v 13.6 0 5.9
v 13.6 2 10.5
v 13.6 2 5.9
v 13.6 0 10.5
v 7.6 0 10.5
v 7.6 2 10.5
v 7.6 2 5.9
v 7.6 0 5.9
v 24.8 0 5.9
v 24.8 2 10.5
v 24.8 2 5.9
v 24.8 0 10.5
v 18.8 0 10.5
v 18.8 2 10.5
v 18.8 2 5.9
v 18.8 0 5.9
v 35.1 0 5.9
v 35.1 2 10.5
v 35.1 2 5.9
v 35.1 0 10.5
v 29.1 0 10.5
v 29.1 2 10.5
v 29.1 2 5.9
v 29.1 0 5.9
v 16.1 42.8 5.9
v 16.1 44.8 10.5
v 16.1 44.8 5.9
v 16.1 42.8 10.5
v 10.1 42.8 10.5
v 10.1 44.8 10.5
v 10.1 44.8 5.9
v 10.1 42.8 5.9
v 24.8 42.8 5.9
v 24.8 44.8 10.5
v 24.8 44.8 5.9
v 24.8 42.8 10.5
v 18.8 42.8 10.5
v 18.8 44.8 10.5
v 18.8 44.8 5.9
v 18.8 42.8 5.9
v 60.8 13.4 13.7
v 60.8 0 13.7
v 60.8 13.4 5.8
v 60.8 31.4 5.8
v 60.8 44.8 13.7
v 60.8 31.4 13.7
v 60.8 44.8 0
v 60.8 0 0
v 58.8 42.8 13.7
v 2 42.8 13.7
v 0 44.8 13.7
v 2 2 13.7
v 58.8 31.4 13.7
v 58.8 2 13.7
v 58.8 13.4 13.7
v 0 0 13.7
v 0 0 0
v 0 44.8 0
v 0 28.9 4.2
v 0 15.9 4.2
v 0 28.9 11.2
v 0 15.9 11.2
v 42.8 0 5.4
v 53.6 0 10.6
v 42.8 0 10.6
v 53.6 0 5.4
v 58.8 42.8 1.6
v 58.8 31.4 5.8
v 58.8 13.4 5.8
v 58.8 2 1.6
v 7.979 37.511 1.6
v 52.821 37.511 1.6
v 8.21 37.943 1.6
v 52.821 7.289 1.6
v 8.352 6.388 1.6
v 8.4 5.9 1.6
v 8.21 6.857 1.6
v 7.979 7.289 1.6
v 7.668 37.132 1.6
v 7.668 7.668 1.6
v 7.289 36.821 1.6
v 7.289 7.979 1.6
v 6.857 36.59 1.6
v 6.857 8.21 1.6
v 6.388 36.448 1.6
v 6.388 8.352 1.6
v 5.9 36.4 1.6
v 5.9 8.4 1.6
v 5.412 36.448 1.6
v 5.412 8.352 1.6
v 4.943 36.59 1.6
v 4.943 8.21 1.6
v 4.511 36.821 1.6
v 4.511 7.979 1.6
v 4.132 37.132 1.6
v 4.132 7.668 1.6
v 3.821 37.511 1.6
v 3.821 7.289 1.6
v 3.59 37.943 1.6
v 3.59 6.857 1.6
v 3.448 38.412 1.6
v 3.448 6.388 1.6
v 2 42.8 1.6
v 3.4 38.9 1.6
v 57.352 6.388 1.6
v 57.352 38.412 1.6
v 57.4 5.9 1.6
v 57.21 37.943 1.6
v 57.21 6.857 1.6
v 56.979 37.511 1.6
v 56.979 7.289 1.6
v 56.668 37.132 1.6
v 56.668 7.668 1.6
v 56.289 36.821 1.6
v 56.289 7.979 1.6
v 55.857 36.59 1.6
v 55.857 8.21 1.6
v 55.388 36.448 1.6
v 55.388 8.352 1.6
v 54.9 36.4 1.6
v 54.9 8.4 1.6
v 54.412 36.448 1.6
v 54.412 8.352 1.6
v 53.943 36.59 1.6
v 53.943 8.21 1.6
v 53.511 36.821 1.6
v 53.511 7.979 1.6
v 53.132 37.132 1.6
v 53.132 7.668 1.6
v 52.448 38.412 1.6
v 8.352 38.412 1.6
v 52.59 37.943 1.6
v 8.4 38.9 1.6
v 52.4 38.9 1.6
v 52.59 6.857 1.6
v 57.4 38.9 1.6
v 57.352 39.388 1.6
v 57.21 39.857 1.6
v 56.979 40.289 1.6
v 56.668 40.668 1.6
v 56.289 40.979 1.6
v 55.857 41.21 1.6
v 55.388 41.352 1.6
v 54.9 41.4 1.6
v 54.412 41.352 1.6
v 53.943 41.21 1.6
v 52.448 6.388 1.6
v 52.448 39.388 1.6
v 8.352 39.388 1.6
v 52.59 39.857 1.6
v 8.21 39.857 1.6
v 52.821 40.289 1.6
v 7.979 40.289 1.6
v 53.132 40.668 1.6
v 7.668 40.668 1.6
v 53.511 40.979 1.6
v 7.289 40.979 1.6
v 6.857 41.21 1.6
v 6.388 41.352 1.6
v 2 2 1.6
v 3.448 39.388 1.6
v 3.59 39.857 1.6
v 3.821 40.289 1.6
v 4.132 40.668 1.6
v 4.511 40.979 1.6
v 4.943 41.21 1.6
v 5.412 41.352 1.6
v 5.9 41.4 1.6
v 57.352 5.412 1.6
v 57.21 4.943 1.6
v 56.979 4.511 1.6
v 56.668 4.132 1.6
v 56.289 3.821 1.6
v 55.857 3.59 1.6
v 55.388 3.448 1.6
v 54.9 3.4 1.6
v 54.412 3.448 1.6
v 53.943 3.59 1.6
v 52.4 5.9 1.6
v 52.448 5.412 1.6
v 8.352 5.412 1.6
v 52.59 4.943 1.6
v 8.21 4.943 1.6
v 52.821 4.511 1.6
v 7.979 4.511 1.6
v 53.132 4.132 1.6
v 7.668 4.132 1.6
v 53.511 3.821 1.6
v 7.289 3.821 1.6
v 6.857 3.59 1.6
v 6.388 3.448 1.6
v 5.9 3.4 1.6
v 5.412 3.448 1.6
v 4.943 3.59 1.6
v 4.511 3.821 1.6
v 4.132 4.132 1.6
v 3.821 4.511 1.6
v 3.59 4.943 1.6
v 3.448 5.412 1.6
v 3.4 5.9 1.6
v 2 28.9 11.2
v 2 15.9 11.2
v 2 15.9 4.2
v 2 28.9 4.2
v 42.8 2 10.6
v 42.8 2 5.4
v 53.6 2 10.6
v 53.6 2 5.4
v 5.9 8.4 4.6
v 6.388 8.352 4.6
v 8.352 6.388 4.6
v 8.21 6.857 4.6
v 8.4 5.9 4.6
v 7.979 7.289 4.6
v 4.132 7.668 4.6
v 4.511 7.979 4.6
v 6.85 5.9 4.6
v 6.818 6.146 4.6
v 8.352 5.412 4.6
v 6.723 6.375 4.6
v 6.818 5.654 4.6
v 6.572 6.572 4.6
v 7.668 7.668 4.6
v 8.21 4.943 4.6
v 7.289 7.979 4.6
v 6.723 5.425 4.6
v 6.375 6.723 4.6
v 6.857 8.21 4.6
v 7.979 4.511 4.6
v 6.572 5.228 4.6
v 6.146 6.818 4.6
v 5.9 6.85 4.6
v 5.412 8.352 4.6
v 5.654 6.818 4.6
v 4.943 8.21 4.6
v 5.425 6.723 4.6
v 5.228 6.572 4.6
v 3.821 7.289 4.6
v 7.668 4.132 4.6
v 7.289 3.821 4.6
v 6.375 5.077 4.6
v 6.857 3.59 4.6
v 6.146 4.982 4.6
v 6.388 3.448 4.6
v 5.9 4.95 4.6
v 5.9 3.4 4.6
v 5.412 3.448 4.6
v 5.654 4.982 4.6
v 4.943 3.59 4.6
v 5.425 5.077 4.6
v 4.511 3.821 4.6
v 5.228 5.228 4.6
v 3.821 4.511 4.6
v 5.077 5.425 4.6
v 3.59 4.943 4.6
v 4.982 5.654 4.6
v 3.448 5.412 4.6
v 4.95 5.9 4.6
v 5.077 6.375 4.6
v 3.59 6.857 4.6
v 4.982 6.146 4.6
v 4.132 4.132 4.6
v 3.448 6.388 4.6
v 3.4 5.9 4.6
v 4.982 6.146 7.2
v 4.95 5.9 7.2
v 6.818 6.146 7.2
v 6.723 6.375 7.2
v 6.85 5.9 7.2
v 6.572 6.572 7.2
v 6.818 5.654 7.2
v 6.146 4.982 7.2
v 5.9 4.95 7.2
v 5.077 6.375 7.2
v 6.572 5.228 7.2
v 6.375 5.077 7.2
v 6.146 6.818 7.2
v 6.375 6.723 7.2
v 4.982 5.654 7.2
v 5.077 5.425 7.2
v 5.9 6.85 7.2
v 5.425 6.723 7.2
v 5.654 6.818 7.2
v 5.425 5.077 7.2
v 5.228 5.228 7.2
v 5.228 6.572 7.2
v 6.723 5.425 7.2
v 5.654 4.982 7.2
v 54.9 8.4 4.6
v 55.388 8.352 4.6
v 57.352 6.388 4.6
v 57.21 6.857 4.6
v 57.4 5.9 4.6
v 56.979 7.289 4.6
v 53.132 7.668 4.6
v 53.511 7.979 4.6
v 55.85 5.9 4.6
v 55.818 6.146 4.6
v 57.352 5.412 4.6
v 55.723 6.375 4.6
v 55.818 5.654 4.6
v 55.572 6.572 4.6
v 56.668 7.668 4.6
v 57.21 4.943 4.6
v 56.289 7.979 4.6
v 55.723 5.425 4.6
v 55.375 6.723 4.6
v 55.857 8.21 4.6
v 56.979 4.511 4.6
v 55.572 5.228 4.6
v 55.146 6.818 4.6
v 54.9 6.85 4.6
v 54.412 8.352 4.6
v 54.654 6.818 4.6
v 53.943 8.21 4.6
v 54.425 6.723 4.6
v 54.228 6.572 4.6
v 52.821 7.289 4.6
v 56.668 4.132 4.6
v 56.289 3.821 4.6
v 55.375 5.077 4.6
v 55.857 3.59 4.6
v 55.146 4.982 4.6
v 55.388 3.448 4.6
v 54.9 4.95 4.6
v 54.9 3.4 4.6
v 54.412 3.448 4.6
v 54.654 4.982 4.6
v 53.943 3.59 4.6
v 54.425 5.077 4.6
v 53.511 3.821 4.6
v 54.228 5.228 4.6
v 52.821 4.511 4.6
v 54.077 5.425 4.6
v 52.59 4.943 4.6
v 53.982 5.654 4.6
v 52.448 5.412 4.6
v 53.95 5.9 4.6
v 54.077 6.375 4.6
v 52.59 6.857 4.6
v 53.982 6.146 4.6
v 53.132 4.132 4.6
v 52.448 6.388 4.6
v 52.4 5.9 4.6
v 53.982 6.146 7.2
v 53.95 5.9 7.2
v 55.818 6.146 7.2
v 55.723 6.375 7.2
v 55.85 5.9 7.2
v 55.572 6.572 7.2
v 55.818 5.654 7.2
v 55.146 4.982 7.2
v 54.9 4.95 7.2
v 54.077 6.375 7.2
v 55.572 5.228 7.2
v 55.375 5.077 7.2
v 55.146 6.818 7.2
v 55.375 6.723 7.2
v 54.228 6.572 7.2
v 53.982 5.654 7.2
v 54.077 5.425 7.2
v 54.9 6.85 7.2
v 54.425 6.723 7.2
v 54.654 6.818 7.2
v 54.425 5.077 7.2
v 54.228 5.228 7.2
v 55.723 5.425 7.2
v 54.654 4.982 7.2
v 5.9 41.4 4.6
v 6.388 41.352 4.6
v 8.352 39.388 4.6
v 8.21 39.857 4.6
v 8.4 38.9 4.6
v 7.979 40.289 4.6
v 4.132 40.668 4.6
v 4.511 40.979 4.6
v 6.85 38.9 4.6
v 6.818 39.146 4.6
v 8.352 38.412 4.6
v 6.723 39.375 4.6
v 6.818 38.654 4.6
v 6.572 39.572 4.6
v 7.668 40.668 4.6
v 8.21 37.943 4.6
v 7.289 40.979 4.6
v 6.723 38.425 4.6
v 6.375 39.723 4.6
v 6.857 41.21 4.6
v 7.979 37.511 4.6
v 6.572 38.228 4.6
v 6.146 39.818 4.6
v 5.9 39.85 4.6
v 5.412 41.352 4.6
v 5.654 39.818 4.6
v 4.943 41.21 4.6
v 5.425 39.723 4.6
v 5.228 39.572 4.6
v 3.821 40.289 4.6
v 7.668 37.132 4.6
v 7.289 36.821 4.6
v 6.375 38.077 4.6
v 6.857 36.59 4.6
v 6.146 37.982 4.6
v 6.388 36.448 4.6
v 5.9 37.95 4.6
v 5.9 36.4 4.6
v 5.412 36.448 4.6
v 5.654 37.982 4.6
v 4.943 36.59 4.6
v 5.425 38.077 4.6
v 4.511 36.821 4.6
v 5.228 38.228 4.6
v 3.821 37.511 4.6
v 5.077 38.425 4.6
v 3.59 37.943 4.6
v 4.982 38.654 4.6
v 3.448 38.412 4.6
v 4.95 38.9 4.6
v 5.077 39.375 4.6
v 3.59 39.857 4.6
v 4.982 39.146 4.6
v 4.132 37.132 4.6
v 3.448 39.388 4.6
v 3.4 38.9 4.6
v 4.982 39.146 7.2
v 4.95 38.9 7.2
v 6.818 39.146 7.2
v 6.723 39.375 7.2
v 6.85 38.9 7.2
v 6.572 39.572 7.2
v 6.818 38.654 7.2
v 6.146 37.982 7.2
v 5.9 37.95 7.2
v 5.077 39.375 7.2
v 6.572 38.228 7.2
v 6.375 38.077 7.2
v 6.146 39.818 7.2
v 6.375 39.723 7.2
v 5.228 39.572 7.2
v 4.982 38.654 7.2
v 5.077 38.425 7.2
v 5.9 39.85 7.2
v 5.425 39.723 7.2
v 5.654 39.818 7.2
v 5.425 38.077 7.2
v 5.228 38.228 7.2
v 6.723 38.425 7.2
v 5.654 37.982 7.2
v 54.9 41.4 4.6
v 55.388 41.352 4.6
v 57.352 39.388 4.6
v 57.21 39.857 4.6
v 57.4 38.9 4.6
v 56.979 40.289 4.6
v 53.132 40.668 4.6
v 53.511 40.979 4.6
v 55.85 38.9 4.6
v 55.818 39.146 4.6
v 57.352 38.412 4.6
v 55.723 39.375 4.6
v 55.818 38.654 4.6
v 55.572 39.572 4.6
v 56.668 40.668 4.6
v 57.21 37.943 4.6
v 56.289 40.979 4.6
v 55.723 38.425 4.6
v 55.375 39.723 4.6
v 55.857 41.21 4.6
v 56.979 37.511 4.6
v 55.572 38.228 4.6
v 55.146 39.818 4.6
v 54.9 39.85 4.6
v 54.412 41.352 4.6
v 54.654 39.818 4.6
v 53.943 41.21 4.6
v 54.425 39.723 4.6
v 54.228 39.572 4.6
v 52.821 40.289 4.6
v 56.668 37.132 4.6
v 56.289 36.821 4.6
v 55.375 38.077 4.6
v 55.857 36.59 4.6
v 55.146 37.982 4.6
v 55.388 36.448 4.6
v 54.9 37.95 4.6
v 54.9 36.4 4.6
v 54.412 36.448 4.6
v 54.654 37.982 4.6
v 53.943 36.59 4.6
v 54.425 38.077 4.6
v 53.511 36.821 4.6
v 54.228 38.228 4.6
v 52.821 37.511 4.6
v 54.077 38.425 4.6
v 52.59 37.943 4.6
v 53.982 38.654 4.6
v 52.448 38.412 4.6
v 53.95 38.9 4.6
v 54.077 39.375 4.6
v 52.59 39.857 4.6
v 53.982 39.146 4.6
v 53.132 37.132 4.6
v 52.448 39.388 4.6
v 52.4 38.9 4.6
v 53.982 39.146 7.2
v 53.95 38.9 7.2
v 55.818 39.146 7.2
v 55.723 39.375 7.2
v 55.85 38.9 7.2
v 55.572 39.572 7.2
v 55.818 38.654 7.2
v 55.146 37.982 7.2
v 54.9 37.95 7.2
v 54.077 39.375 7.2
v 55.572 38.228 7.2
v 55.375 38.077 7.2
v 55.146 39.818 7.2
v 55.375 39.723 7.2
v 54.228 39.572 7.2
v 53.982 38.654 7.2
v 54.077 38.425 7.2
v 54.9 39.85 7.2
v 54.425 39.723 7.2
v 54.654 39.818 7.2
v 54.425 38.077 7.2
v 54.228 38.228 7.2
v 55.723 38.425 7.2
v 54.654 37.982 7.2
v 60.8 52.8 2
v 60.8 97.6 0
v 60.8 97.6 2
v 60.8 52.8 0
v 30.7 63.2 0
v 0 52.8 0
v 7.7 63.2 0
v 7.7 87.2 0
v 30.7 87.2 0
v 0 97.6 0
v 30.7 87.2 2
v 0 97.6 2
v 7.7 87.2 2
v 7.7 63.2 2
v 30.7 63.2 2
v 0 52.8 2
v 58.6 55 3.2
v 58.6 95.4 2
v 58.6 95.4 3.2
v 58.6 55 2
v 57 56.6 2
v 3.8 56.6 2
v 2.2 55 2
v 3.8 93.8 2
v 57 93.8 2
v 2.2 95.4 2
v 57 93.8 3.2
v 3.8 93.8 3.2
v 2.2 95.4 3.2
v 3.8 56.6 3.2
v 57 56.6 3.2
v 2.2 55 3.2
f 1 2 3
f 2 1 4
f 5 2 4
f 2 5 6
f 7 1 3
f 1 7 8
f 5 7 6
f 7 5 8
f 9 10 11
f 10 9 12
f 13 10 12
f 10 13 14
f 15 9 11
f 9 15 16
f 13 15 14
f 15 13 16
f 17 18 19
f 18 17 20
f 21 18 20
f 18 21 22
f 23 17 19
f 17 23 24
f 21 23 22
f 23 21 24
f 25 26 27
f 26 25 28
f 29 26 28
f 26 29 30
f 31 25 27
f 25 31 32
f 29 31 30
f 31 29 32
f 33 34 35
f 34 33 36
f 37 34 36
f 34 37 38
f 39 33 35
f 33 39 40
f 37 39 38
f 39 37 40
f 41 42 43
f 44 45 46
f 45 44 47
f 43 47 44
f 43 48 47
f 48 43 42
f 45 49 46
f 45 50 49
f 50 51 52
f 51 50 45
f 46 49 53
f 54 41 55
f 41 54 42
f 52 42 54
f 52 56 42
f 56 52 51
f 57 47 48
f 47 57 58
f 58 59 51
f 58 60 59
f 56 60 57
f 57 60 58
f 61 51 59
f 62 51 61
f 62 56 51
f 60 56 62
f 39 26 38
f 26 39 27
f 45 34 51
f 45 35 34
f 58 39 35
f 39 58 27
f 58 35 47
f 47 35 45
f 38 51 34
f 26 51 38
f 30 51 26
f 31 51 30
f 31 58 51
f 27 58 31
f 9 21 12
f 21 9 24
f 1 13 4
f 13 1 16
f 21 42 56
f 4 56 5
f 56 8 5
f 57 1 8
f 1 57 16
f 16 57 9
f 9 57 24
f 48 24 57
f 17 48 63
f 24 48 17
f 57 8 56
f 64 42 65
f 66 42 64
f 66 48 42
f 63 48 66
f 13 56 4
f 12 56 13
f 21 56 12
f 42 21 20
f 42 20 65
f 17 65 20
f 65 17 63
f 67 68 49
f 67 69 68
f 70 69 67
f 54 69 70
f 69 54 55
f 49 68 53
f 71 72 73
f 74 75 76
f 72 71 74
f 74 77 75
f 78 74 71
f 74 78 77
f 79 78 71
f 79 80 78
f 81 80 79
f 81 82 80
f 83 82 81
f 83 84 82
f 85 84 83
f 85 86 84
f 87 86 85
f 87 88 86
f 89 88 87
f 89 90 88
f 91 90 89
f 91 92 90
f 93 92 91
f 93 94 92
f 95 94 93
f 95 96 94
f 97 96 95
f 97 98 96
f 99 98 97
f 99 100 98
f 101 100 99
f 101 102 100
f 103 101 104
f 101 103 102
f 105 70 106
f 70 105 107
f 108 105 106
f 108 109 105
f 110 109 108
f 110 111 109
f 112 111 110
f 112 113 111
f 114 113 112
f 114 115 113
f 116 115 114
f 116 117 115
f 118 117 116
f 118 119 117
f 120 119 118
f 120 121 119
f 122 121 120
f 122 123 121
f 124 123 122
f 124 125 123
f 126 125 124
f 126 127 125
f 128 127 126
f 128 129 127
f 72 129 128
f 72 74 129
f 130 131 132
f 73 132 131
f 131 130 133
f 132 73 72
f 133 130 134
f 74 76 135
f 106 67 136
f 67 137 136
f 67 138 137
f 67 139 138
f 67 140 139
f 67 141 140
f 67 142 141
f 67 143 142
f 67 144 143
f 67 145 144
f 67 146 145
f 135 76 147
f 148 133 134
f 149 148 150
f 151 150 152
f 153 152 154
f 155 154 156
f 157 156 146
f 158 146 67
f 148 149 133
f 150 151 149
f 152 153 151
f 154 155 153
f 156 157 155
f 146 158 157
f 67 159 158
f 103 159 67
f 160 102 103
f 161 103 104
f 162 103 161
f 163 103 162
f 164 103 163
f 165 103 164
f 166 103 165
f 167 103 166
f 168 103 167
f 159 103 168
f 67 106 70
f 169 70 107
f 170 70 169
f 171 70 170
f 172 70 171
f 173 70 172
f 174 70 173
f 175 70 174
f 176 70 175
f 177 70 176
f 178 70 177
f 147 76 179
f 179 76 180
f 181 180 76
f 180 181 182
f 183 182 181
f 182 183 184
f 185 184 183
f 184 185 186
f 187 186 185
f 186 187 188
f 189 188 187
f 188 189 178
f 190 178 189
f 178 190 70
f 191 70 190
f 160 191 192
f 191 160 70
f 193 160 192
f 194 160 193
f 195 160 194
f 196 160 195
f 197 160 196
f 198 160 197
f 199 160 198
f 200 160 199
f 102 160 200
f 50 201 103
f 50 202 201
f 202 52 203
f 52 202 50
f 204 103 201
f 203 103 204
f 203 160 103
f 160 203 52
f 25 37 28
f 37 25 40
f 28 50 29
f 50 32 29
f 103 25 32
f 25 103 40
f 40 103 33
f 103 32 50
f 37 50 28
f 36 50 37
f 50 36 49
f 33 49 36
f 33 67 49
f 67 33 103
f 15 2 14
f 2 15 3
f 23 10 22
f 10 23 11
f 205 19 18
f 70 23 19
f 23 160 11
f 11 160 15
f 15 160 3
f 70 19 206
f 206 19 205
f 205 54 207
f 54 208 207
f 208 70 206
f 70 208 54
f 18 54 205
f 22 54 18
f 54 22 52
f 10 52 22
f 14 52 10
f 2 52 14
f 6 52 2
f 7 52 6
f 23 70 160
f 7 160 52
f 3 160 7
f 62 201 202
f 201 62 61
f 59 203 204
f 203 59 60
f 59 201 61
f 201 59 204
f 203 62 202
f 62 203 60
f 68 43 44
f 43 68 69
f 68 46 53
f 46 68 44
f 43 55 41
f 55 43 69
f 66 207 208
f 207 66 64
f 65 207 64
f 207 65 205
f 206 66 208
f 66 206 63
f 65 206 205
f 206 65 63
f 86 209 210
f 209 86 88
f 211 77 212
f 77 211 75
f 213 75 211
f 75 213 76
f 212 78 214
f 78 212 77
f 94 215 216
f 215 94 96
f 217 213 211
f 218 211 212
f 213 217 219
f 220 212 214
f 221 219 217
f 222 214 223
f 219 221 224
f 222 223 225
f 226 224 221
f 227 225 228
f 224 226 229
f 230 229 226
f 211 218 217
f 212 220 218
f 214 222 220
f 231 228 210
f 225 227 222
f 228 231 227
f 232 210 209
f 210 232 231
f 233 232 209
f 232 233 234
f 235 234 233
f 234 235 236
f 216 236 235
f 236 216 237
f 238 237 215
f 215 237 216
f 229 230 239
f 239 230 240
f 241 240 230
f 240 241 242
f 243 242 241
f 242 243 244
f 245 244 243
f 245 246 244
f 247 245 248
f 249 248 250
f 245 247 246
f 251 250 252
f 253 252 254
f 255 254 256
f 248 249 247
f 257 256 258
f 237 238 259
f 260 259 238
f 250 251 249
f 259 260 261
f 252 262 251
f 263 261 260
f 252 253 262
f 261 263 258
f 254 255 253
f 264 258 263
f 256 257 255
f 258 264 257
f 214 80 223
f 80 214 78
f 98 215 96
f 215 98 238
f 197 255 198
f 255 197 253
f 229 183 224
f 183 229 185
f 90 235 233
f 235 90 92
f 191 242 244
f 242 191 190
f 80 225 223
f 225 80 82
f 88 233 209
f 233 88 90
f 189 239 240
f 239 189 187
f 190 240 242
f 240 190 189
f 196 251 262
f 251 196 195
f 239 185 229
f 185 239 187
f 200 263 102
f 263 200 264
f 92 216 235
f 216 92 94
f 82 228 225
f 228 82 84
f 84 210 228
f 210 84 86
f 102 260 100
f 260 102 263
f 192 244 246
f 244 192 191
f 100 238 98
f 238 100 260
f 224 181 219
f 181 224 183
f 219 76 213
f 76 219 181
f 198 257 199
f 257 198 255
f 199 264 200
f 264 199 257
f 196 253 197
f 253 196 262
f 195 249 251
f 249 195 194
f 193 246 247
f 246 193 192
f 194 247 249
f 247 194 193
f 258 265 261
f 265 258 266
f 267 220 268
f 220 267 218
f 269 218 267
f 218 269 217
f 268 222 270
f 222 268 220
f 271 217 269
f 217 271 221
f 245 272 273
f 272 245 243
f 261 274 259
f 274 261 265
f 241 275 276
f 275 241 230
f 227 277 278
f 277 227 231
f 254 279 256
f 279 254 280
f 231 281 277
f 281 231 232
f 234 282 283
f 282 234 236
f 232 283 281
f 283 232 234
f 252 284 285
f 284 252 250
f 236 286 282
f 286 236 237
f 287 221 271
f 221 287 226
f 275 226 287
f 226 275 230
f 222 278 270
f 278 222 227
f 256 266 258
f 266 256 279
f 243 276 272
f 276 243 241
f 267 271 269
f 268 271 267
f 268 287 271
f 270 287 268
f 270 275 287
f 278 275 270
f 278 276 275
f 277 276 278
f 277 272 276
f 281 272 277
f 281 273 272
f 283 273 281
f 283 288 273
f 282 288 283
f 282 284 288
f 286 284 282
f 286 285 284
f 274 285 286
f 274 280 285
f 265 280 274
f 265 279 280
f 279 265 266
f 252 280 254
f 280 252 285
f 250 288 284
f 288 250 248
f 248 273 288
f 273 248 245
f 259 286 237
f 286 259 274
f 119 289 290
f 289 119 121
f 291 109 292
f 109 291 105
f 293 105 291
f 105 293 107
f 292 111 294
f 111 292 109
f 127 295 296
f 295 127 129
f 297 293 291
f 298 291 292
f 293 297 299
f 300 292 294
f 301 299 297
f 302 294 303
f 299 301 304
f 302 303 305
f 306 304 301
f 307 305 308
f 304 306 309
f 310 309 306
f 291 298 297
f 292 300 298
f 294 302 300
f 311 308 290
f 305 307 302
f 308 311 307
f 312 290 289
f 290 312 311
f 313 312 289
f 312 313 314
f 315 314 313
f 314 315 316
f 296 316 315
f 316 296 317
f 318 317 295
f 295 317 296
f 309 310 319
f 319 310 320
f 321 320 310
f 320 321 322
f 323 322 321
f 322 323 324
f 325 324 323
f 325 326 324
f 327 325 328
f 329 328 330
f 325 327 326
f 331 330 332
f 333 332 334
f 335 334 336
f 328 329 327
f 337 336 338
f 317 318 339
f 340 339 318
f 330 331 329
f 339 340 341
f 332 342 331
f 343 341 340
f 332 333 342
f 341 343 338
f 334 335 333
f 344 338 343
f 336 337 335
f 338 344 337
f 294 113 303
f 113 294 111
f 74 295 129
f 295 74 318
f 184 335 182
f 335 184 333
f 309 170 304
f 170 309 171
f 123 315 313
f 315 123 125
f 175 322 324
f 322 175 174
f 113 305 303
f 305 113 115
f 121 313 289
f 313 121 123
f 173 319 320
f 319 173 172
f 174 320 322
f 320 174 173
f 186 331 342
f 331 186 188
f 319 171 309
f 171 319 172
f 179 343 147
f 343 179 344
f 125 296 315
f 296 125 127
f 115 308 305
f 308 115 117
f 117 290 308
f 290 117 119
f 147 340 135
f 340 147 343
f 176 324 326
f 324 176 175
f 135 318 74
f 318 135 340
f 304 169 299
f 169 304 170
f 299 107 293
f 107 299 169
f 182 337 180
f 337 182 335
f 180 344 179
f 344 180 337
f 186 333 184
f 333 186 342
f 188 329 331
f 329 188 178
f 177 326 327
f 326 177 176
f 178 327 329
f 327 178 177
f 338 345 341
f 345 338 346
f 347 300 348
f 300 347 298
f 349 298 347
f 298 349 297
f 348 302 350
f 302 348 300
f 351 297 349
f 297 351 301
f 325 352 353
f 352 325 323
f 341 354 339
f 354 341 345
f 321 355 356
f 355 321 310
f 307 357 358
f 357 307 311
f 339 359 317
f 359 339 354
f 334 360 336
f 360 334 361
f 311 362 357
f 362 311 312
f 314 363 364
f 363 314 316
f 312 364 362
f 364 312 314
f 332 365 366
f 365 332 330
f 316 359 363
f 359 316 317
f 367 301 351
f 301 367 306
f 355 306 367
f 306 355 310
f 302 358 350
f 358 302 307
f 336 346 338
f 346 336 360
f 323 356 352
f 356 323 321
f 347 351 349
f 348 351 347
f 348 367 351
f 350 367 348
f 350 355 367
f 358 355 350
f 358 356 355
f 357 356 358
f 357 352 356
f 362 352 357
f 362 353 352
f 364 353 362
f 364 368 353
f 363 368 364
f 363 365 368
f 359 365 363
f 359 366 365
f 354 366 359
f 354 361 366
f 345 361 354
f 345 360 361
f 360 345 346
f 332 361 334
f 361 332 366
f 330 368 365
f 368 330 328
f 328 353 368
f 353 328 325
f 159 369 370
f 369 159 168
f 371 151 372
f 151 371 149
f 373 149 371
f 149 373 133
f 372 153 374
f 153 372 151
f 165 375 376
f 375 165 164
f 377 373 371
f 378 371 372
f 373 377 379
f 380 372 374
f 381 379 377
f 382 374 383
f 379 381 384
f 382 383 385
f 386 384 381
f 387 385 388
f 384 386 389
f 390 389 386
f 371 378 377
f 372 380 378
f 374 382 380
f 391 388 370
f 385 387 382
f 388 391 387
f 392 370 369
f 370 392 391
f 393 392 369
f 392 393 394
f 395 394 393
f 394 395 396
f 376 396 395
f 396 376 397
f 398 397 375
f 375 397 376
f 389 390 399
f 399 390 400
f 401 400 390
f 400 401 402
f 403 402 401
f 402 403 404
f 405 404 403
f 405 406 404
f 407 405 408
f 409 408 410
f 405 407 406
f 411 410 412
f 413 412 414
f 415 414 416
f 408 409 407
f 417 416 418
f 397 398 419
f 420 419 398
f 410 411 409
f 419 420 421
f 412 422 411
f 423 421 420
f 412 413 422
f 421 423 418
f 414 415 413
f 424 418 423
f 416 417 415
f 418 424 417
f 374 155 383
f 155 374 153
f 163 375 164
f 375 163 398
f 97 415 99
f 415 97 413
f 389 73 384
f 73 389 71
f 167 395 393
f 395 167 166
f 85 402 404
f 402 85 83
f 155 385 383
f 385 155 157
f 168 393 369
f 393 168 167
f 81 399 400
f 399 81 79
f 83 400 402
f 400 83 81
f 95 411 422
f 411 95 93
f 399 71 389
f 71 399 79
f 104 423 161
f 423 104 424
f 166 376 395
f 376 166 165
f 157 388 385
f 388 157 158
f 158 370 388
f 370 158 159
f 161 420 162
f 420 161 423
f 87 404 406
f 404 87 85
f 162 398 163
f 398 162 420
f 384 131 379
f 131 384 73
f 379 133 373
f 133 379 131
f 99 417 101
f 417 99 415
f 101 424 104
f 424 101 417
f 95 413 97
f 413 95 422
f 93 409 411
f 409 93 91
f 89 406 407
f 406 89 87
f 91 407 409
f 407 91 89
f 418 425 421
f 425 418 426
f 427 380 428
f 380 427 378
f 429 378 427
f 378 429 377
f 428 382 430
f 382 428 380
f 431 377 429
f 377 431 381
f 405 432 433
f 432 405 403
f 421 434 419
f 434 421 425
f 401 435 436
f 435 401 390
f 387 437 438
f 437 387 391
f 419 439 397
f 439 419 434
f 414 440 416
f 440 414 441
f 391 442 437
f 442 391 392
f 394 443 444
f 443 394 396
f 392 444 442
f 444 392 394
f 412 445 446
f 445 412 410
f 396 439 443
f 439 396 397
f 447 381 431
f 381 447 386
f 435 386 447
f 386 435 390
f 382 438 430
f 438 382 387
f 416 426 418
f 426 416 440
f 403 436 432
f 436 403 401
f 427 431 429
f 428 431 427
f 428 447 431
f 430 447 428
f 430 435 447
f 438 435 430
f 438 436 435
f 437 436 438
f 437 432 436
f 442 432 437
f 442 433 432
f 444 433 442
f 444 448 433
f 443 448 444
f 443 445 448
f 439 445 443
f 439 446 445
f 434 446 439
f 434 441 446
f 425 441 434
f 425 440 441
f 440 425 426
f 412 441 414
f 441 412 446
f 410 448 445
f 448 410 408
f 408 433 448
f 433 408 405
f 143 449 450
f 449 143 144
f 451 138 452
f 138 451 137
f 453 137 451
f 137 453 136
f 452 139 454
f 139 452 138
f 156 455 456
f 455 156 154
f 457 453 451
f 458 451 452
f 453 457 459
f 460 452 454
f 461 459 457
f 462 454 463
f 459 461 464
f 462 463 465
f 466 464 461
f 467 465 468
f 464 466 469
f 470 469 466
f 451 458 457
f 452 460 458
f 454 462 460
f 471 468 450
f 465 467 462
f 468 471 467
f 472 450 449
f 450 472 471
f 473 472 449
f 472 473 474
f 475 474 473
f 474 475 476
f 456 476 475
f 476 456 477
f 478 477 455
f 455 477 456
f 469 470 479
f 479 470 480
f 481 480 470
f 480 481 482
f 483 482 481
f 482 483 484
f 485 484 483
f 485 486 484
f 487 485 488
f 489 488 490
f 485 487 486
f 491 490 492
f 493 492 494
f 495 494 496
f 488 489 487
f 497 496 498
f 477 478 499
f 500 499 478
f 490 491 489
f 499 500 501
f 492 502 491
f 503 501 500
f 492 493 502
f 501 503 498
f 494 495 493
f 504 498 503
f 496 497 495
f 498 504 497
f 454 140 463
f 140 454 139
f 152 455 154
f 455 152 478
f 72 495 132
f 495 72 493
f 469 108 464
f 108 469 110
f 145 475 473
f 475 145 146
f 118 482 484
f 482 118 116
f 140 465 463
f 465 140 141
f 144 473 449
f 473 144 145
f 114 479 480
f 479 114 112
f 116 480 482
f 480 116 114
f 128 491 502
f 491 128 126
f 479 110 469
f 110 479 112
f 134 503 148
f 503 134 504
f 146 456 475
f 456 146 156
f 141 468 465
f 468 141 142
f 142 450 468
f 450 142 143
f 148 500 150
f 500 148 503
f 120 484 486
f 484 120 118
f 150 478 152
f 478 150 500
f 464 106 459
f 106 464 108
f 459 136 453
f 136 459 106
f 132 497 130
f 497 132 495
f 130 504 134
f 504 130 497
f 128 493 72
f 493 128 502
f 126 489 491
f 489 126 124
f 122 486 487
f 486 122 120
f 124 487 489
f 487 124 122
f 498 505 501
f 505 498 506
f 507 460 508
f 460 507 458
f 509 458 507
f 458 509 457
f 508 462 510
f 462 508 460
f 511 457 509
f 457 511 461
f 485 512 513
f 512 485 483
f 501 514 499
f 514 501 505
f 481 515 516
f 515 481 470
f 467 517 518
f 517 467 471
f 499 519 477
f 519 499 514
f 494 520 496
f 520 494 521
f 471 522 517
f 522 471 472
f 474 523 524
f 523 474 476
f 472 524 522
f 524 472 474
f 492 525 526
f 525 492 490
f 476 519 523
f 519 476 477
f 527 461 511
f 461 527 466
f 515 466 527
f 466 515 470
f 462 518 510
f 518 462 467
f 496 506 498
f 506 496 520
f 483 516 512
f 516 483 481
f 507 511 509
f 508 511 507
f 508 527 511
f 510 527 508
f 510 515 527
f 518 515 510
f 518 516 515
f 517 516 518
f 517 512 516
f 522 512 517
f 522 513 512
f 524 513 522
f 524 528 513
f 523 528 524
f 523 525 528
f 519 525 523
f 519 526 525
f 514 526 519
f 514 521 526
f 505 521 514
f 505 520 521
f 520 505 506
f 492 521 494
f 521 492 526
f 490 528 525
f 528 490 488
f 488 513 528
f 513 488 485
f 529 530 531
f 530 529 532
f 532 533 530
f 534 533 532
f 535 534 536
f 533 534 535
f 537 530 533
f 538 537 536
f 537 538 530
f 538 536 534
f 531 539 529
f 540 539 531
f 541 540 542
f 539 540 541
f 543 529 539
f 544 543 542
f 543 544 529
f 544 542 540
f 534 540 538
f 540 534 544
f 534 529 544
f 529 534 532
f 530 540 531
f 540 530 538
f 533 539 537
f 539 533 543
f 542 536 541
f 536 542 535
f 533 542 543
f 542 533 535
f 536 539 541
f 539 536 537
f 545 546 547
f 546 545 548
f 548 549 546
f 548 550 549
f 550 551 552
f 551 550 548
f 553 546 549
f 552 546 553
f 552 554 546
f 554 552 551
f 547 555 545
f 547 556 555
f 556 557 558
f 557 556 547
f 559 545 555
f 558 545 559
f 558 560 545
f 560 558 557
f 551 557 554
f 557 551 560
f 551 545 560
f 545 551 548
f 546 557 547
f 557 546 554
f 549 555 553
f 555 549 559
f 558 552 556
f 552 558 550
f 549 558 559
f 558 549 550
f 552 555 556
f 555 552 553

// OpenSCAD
// Pocket case for the ESP32-S3-USB-OTG board (68 x 40 mm listing). Fully enclosed: openings only for the screen, both USB ends,
// the Type-C debug port, and the sideways-facing buttons (windows in the front/back walls). PLACEHOLDER DIMENSIONS - measure your board
// with calipers and change the numbers in the first block. Two parts: base tray and lid. Print both flat.
// Coordinates: X along the board length (plug end = 0), Y across, Z up. All sizes in mm.
// View/export: open in OpenSCAD (openscad.org), press F6, then File > Export > STL. Set part = "base", "lid" or "both".

part = "both";           // "base", "lid", "both" (both = side by side for printing), "assembled" (preview only)

// ---- measure these on the real board -------------------------------------------------------
pcb_l   = 56;     // board length WITHOUT the male USB-A plug
pcb_w   = 40;     // board width
pcb_t   = 1.6;    // PCB thickness
plug_l  = 12;     // how far the male USB-A plug sticks out of the board's left edge
plug_w  = 12.2;   // male plug width
plug_h  = 4.6;    // male plug height
sock_w  = 14.0;   // female USB-A socket width (host port), right edge
sock_h  = 6.8;    // female USB-A socket height
comp_h  = 7.5;    // tallest part above the PCB top (usually the USB-A socket)
under_h = 3.0;    // clearance under the PCB for pins/solder (also the standoff height)
hole_inset = 3.5; // corner mounting hole centre, distance from board edges
hole_d  = 2.2;    // board mounting hole diameter
screen_x = 16.8; screen_w = 23.0; screen_h = 24.0;   // LCD window: centre x from board left edge, size; centred across Y
btn_top = [10.7, 19.4];           // x of the two buttons on the top edge
btn_bot = [8.2, 19.4, 29.7];      // x of the three buttons on the bottom edge
btn_win_w = 6.0;                  // width of the window in the side wall at each (sideways-facing) button
btn_win_h = 4.6;                  // height of that window, measured from the PCB top surface
cable_w = 18.0; cable_h = 10.5;   // opening at the host end: wide enough for the A-to-C cable's plug body
usbc_x  = 45.8; usbc_w = 10.0; usbc_h = 4.0;          // Type-C debug port on the bottom (Y = 0) edge
// ---- case settings -------------------------------------------------------------------------
clr   = 0.4;      // gap around the board
wall  = 2.0;
floor_t = 1.6;
lid_t = 2.0;
screw_d = 1.8;    // pilot hole for M2 self-tapping screws
post_d  = 5.0;

in_l  = pcb_l + 2*clr;
in_w  = pcb_w + 2*clr;
out_l = in_l + 2*wall;
out_w = in_w + 2*wall;
base_h = floor_t + under_h + pcb_t + comp_h;      // top of cavity
pcb_z  = floor_t + under_h;                       // PCB underside
ox = wall + clr;  oy = wall + clr;                // board origin inside the case
hole_pts = [[hole_inset, hole_inset],[pcb_l-hole_inset, hole_inset],
            [hole_inset, pcb_w-hole_inset],[pcb_l-hole_inset, pcb_w-hole_inset]];

module base() {
  difference() {
    cube([out_l, out_w, base_h]);
    translate([wall, wall, floor_t]) cube([in_l, in_w, base_h]);
    // male plug slot (left wall)
    translate([-1, oy + pcb_w/2 - (plug_w+0.8)/2, pcb_z - 0.4]) cube([wall+2, plug_w+0.8, plug_h+pcb_t+0.8]);
    // host end opening (right wall): the cable's plug body is wider than the socket, so make room for it
    translate([out_l-wall-1, oy + pcb_w/2 - cable_w/2, pcb_z + pcb_t - 0.4]) cube([wall+2, cable_w, cable_h]);
    // windows for the sideways-facing buttons: bottom edge buttons through the front wall, top edge through the back wall
    for (x = btn_bot) translate([ox + x - btn_win_w/2, -1, pcb_z + pcb_t - 0.3]) cube([btn_win_w, wall+2, btn_win_h]);
    for (x = btn_top) translate([ox + x - btn_win_w/2, out_w - wall - 1, pcb_z + pcb_t - 0.3]) cube([btn_win_w, wall+2, btn_win_h]);
    // Type-C debug port opening (front wall)
    translate([ox + usbc_x - usbc_w/2 - 0.4, -1, pcb_z + pcb_t - 0.8]) cube([usbc_w+0.8, wall+2, usbc_h+1.2]);
  }
  // board posts through the corner holes + screw posts
  for (p = hole_pts) translate([ox + p[0], oy + p[1], 0]) {
    cylinder(d=post_d, h=pcb_z, $fn=32);
    cylinder(d=hole_d-0.3, h=pcb_z+pcb_t+1, $fn=24);
  }
}

module lid() {
  difference() {
    translate([0,0,0]) cube([out_l, out_w, lid_t]);
    // LCD window
    translate([ox + screen_x - screen_w/2, oy + pcb_w/2 - screen_h/2, -1]) cube([screen_w, screen_h, lid_t+2]);
  }
  // lip that drops into the opening so the lid cannot slide
  translate([wall+0.2, wall+0.2, -1.2]) difference() {
    cube([in_l-0.4, in_w-0.4, 1.2]);
    translate([1.6,1.6,-1]) cube([in_l-0.4-3.2, in_w-0.4-3.2, 3]);
  }
}

if (part == "base") base();
else if (part == "lid") translate([0,0,lid_t]) rotate([180,0,0]) translate([0,-out_w,0]) lid();
else if (part == "assembled") { base(); translate([0,0,base_h]) lid(); }
else { base(); translate([0, out_w + 8, 0]) translate([0,0,lid_t]) rotate([180,0,0]) translate([0,-out_w,0]) lid(); }
